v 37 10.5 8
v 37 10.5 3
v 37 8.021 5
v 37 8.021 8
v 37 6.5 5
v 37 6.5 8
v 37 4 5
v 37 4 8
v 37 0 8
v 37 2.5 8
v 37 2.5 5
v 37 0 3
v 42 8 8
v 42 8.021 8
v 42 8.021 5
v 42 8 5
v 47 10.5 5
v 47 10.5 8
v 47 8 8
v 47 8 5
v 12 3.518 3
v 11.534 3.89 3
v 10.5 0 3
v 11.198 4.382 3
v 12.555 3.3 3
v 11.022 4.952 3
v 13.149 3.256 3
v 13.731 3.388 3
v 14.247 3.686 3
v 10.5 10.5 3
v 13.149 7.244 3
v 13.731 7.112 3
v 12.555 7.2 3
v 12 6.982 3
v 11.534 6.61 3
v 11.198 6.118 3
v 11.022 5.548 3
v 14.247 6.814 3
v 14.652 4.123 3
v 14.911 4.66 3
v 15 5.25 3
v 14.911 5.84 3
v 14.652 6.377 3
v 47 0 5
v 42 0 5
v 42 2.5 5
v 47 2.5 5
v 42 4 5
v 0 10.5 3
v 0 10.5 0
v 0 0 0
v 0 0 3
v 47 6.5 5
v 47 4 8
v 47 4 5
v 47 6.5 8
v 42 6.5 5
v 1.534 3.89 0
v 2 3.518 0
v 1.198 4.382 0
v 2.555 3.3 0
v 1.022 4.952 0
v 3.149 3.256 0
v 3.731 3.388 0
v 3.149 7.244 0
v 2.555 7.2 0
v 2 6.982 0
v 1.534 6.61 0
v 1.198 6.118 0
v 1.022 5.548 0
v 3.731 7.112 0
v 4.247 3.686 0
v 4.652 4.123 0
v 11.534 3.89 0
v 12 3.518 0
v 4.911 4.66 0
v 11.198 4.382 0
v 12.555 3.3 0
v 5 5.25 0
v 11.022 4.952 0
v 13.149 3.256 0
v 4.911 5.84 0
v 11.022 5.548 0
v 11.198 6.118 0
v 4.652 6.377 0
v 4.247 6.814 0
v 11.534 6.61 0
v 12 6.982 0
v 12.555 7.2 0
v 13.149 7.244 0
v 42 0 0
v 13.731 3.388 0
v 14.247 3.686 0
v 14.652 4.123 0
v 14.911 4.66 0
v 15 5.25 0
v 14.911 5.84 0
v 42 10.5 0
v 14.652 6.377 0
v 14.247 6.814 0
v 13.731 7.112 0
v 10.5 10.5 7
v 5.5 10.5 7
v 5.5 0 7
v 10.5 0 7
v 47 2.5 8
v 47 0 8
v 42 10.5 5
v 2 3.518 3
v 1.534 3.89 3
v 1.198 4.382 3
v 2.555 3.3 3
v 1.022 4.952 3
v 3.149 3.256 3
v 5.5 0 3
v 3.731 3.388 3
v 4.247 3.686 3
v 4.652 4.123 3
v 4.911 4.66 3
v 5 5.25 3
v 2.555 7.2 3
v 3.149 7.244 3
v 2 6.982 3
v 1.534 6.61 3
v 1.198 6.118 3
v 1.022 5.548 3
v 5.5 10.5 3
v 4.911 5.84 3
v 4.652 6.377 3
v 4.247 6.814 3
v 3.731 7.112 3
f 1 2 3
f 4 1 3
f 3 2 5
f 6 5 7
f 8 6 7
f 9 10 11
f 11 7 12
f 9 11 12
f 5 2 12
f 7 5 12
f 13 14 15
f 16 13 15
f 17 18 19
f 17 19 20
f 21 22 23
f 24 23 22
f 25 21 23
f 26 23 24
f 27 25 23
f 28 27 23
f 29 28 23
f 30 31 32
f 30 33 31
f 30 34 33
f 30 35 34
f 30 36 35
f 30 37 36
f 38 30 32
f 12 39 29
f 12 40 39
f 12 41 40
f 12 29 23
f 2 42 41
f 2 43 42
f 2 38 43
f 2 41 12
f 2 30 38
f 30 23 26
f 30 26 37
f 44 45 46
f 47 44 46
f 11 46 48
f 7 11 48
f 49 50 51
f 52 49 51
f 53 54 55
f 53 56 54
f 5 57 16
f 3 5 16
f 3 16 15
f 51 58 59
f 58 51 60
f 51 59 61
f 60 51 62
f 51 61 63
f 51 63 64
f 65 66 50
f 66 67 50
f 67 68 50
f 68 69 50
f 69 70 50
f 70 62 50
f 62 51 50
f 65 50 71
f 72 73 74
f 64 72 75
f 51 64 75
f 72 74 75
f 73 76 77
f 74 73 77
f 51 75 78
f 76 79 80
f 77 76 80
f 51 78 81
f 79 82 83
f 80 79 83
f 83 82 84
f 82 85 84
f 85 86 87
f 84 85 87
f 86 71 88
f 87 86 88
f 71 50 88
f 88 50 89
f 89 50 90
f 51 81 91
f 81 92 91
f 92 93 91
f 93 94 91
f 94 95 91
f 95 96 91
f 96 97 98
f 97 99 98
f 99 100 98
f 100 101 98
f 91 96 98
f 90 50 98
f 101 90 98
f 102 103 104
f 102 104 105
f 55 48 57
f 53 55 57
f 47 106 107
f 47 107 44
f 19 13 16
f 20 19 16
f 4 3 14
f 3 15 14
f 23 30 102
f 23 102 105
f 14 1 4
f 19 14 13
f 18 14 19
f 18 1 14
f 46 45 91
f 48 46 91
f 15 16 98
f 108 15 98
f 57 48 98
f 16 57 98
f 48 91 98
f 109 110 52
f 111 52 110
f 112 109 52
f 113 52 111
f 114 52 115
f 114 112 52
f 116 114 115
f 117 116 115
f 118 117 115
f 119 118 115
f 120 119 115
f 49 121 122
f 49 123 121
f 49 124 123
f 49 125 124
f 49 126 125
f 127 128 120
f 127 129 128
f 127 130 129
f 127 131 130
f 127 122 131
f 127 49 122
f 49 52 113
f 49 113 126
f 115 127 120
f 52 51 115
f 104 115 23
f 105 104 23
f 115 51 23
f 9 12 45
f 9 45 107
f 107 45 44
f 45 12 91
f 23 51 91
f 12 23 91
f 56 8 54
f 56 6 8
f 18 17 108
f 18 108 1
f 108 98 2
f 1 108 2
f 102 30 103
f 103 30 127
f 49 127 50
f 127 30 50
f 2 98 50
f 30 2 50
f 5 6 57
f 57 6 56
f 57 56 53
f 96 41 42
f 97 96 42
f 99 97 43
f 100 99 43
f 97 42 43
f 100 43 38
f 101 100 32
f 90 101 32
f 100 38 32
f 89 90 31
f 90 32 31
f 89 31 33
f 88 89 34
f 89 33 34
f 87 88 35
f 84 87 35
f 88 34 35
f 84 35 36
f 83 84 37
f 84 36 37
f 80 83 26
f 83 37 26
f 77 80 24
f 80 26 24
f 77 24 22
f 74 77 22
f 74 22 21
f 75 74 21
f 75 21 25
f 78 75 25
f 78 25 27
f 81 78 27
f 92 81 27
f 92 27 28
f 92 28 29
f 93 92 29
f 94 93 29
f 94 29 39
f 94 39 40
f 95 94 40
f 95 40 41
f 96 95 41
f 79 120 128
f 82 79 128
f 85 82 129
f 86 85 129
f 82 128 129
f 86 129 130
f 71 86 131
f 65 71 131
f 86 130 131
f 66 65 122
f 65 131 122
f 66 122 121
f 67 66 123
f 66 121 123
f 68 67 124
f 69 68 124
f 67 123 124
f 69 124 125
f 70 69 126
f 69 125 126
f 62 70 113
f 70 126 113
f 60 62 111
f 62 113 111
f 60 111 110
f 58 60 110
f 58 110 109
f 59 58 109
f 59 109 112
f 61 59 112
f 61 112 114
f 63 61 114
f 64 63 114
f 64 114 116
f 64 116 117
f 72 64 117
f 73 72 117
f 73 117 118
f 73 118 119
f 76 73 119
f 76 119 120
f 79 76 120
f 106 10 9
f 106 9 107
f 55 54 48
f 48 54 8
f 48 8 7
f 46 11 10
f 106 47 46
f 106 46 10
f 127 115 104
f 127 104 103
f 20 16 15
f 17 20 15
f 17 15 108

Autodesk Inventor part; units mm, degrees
ref_plane "YZ Plane" through (0, 0, 0) normal (1, 0, 0) x (0, 1, 0)
ref_plane "XZ Plane" through (0, 0, 0) normal (0, 1, 0) x (-1, 0, 0)
ref_plane "XY Plane" through (0, 0, 0) normal (0, 0, 1) x (1, 0, 0)
sketch "Esquisse1" plane through (0, 0, 0) normal (0, 0, 1) x (1, 0, 0)
  line L0 (0, 0) -> (42, 0)
  line L1 (42, 0) -> (42, 10.5)
  line L2 (42, 10.5) -> (0, 10.5)
  line L3 (0, 10.5) -> (0, 0)
  dimension "d0" = 42
  dimension "d1" = 10.5
extrude "Extrusion1" add sketch "Esquisse1" along normal blind 3
sketch "Esquisse2" plane through (0, 0, 3) normal (0, 0, 1) x (1, 0, 0)
  line L0 (0, 10.5) -> (0, 0) projected
  circle A0 centre (3, 5.25) radius 2
  circle A1 centre (13, 5.25) radius 2
  dimension "d4" = 3
  dimension "d5" = 10
  dimension "d6" = 4
  dimension "d7" = 4
extrude "Extrusion2" cut sketch "Esquisse2" against normal through all
sketch "Esquisse3" plane through (0, 0, 3) normal (0, 0, 1) x (1, 0, 0)
  line L0 (0, 10.5) -> (0, 0) projected
  line L1 (0, 10.5) -> (5.5, 10.5)
  line L2 (42, 10.5) -> (0, 10.5) projected
  line L3 (5.5, 10.5) -> (10.5, 10.5)
  line L4 (10.5, 10.5) -> (10.5, 0)
  line L5 (10.5, 0) -> (5.5, 0)
  line L6 (5.5, 0) -> (5.5, 10.5)
  dimension "d10" = 5.5
  dimension "d11" = 5
  dimension "d12" = 10.5
extrude "Extrusion3" add sketch "Esquisse3" along normal blind 4
sketch "Esquisse4" plane through (0, 0, 3) normal (0, 0, 1) x (1, 0, 0)
  line L0 (42, 10.5) -> (0, 10.5) projected
  line L1 (42, 10.5) -> (37, 10.5)
  line L2 (37, 10.5) -> (37, 0)
  line L3 (37, 0) -> (42, 0)
  line L4 (42, 0) -> (42, 10.5)
  point P0 (0, 0)
  dimension "d15" = 5
  dimension "d16" = 10.5
extrude "Extrusion4" add sketch "Esquisse4" along normal blind 5
sketch "Esquisse5" plane through (42, 0, 0) normal (1, 0, 0) x (0, 0, -1)
  line L0 (-8, 10.5) -> (-8, 0) projected
  line L1 (-8, 0) -> (-5, 0)
  line L2 (-5, 0) -> (-5, 2.5)
  line L3 (-5, 2.5) -> (-8, 2.5)
  line L4 (-8, 2.5) -> (-8, 0)
  line L5 (-8, 2.5) -> (-8, 4)
  line L6 (-8, 4) -> (-5, 4)
  line L7 (-5, 4) -> (-5, 6.5)
  line L8 (-5, 6.5) -> (-8, 6.5)
  line L9 (-8, 6.5) -> (-8, 4)
  line L10 (-8, 6.5) -> (-8, 8)
  line L11 (-8, 8) -> (-5, 8)
  line L12 (-5, 8) -> (-5, 10.5)
  line L13 (-5, 10.5) -> (-8, 10.5)
  line L14 (-8, 10.5) -> (-8, 8)
  point P0 (0, 0)
  dimension "d21" = 3
  dimension "d22" = 2.5
  dimension "d23" = 1.5
  dimension "d24" = 3
  dimension "d25" = 2.5
  dimension "d26" = 1.5
  dimension "d27" = 3
  dimension "d28" = 2.5
extrude "Extrusion5" add sketch "Esquisse5" along normal blind 5
sketch "Esquisse6" plane through (42, 0, 0) normal (1, 0, 0) x (0, 0, -1)
  line L0 (-5, 2.5) -> (-8, 2.5) projected
  line L1 (-5, 6.5) -> (-5, 4) projected
  line L2 (-8, 2.5) -> (-5, 2.5)
  line L3 (-5, 2.5) -> (-5, 4)
  line L4 (-5, 4) -> (-8, 4)
  line L5 (-8, 4) -> (-8, 2.5)
  line L6 (-8, 6.5) -> (-5, 6.5)
  line L7 (-5, 6.5) -> (-5, 8.0213)
  line L8 (-5, 8.0213) -> (-8, 8.0213)
  line L9 (-8, 8.0213) -> (-8, 6.5)
  point P0 (0, 0)
extrude "Extrusion6" cut sketch "Esquisse6" against normal blind 5
properties part number "IF - TCRT5000"
